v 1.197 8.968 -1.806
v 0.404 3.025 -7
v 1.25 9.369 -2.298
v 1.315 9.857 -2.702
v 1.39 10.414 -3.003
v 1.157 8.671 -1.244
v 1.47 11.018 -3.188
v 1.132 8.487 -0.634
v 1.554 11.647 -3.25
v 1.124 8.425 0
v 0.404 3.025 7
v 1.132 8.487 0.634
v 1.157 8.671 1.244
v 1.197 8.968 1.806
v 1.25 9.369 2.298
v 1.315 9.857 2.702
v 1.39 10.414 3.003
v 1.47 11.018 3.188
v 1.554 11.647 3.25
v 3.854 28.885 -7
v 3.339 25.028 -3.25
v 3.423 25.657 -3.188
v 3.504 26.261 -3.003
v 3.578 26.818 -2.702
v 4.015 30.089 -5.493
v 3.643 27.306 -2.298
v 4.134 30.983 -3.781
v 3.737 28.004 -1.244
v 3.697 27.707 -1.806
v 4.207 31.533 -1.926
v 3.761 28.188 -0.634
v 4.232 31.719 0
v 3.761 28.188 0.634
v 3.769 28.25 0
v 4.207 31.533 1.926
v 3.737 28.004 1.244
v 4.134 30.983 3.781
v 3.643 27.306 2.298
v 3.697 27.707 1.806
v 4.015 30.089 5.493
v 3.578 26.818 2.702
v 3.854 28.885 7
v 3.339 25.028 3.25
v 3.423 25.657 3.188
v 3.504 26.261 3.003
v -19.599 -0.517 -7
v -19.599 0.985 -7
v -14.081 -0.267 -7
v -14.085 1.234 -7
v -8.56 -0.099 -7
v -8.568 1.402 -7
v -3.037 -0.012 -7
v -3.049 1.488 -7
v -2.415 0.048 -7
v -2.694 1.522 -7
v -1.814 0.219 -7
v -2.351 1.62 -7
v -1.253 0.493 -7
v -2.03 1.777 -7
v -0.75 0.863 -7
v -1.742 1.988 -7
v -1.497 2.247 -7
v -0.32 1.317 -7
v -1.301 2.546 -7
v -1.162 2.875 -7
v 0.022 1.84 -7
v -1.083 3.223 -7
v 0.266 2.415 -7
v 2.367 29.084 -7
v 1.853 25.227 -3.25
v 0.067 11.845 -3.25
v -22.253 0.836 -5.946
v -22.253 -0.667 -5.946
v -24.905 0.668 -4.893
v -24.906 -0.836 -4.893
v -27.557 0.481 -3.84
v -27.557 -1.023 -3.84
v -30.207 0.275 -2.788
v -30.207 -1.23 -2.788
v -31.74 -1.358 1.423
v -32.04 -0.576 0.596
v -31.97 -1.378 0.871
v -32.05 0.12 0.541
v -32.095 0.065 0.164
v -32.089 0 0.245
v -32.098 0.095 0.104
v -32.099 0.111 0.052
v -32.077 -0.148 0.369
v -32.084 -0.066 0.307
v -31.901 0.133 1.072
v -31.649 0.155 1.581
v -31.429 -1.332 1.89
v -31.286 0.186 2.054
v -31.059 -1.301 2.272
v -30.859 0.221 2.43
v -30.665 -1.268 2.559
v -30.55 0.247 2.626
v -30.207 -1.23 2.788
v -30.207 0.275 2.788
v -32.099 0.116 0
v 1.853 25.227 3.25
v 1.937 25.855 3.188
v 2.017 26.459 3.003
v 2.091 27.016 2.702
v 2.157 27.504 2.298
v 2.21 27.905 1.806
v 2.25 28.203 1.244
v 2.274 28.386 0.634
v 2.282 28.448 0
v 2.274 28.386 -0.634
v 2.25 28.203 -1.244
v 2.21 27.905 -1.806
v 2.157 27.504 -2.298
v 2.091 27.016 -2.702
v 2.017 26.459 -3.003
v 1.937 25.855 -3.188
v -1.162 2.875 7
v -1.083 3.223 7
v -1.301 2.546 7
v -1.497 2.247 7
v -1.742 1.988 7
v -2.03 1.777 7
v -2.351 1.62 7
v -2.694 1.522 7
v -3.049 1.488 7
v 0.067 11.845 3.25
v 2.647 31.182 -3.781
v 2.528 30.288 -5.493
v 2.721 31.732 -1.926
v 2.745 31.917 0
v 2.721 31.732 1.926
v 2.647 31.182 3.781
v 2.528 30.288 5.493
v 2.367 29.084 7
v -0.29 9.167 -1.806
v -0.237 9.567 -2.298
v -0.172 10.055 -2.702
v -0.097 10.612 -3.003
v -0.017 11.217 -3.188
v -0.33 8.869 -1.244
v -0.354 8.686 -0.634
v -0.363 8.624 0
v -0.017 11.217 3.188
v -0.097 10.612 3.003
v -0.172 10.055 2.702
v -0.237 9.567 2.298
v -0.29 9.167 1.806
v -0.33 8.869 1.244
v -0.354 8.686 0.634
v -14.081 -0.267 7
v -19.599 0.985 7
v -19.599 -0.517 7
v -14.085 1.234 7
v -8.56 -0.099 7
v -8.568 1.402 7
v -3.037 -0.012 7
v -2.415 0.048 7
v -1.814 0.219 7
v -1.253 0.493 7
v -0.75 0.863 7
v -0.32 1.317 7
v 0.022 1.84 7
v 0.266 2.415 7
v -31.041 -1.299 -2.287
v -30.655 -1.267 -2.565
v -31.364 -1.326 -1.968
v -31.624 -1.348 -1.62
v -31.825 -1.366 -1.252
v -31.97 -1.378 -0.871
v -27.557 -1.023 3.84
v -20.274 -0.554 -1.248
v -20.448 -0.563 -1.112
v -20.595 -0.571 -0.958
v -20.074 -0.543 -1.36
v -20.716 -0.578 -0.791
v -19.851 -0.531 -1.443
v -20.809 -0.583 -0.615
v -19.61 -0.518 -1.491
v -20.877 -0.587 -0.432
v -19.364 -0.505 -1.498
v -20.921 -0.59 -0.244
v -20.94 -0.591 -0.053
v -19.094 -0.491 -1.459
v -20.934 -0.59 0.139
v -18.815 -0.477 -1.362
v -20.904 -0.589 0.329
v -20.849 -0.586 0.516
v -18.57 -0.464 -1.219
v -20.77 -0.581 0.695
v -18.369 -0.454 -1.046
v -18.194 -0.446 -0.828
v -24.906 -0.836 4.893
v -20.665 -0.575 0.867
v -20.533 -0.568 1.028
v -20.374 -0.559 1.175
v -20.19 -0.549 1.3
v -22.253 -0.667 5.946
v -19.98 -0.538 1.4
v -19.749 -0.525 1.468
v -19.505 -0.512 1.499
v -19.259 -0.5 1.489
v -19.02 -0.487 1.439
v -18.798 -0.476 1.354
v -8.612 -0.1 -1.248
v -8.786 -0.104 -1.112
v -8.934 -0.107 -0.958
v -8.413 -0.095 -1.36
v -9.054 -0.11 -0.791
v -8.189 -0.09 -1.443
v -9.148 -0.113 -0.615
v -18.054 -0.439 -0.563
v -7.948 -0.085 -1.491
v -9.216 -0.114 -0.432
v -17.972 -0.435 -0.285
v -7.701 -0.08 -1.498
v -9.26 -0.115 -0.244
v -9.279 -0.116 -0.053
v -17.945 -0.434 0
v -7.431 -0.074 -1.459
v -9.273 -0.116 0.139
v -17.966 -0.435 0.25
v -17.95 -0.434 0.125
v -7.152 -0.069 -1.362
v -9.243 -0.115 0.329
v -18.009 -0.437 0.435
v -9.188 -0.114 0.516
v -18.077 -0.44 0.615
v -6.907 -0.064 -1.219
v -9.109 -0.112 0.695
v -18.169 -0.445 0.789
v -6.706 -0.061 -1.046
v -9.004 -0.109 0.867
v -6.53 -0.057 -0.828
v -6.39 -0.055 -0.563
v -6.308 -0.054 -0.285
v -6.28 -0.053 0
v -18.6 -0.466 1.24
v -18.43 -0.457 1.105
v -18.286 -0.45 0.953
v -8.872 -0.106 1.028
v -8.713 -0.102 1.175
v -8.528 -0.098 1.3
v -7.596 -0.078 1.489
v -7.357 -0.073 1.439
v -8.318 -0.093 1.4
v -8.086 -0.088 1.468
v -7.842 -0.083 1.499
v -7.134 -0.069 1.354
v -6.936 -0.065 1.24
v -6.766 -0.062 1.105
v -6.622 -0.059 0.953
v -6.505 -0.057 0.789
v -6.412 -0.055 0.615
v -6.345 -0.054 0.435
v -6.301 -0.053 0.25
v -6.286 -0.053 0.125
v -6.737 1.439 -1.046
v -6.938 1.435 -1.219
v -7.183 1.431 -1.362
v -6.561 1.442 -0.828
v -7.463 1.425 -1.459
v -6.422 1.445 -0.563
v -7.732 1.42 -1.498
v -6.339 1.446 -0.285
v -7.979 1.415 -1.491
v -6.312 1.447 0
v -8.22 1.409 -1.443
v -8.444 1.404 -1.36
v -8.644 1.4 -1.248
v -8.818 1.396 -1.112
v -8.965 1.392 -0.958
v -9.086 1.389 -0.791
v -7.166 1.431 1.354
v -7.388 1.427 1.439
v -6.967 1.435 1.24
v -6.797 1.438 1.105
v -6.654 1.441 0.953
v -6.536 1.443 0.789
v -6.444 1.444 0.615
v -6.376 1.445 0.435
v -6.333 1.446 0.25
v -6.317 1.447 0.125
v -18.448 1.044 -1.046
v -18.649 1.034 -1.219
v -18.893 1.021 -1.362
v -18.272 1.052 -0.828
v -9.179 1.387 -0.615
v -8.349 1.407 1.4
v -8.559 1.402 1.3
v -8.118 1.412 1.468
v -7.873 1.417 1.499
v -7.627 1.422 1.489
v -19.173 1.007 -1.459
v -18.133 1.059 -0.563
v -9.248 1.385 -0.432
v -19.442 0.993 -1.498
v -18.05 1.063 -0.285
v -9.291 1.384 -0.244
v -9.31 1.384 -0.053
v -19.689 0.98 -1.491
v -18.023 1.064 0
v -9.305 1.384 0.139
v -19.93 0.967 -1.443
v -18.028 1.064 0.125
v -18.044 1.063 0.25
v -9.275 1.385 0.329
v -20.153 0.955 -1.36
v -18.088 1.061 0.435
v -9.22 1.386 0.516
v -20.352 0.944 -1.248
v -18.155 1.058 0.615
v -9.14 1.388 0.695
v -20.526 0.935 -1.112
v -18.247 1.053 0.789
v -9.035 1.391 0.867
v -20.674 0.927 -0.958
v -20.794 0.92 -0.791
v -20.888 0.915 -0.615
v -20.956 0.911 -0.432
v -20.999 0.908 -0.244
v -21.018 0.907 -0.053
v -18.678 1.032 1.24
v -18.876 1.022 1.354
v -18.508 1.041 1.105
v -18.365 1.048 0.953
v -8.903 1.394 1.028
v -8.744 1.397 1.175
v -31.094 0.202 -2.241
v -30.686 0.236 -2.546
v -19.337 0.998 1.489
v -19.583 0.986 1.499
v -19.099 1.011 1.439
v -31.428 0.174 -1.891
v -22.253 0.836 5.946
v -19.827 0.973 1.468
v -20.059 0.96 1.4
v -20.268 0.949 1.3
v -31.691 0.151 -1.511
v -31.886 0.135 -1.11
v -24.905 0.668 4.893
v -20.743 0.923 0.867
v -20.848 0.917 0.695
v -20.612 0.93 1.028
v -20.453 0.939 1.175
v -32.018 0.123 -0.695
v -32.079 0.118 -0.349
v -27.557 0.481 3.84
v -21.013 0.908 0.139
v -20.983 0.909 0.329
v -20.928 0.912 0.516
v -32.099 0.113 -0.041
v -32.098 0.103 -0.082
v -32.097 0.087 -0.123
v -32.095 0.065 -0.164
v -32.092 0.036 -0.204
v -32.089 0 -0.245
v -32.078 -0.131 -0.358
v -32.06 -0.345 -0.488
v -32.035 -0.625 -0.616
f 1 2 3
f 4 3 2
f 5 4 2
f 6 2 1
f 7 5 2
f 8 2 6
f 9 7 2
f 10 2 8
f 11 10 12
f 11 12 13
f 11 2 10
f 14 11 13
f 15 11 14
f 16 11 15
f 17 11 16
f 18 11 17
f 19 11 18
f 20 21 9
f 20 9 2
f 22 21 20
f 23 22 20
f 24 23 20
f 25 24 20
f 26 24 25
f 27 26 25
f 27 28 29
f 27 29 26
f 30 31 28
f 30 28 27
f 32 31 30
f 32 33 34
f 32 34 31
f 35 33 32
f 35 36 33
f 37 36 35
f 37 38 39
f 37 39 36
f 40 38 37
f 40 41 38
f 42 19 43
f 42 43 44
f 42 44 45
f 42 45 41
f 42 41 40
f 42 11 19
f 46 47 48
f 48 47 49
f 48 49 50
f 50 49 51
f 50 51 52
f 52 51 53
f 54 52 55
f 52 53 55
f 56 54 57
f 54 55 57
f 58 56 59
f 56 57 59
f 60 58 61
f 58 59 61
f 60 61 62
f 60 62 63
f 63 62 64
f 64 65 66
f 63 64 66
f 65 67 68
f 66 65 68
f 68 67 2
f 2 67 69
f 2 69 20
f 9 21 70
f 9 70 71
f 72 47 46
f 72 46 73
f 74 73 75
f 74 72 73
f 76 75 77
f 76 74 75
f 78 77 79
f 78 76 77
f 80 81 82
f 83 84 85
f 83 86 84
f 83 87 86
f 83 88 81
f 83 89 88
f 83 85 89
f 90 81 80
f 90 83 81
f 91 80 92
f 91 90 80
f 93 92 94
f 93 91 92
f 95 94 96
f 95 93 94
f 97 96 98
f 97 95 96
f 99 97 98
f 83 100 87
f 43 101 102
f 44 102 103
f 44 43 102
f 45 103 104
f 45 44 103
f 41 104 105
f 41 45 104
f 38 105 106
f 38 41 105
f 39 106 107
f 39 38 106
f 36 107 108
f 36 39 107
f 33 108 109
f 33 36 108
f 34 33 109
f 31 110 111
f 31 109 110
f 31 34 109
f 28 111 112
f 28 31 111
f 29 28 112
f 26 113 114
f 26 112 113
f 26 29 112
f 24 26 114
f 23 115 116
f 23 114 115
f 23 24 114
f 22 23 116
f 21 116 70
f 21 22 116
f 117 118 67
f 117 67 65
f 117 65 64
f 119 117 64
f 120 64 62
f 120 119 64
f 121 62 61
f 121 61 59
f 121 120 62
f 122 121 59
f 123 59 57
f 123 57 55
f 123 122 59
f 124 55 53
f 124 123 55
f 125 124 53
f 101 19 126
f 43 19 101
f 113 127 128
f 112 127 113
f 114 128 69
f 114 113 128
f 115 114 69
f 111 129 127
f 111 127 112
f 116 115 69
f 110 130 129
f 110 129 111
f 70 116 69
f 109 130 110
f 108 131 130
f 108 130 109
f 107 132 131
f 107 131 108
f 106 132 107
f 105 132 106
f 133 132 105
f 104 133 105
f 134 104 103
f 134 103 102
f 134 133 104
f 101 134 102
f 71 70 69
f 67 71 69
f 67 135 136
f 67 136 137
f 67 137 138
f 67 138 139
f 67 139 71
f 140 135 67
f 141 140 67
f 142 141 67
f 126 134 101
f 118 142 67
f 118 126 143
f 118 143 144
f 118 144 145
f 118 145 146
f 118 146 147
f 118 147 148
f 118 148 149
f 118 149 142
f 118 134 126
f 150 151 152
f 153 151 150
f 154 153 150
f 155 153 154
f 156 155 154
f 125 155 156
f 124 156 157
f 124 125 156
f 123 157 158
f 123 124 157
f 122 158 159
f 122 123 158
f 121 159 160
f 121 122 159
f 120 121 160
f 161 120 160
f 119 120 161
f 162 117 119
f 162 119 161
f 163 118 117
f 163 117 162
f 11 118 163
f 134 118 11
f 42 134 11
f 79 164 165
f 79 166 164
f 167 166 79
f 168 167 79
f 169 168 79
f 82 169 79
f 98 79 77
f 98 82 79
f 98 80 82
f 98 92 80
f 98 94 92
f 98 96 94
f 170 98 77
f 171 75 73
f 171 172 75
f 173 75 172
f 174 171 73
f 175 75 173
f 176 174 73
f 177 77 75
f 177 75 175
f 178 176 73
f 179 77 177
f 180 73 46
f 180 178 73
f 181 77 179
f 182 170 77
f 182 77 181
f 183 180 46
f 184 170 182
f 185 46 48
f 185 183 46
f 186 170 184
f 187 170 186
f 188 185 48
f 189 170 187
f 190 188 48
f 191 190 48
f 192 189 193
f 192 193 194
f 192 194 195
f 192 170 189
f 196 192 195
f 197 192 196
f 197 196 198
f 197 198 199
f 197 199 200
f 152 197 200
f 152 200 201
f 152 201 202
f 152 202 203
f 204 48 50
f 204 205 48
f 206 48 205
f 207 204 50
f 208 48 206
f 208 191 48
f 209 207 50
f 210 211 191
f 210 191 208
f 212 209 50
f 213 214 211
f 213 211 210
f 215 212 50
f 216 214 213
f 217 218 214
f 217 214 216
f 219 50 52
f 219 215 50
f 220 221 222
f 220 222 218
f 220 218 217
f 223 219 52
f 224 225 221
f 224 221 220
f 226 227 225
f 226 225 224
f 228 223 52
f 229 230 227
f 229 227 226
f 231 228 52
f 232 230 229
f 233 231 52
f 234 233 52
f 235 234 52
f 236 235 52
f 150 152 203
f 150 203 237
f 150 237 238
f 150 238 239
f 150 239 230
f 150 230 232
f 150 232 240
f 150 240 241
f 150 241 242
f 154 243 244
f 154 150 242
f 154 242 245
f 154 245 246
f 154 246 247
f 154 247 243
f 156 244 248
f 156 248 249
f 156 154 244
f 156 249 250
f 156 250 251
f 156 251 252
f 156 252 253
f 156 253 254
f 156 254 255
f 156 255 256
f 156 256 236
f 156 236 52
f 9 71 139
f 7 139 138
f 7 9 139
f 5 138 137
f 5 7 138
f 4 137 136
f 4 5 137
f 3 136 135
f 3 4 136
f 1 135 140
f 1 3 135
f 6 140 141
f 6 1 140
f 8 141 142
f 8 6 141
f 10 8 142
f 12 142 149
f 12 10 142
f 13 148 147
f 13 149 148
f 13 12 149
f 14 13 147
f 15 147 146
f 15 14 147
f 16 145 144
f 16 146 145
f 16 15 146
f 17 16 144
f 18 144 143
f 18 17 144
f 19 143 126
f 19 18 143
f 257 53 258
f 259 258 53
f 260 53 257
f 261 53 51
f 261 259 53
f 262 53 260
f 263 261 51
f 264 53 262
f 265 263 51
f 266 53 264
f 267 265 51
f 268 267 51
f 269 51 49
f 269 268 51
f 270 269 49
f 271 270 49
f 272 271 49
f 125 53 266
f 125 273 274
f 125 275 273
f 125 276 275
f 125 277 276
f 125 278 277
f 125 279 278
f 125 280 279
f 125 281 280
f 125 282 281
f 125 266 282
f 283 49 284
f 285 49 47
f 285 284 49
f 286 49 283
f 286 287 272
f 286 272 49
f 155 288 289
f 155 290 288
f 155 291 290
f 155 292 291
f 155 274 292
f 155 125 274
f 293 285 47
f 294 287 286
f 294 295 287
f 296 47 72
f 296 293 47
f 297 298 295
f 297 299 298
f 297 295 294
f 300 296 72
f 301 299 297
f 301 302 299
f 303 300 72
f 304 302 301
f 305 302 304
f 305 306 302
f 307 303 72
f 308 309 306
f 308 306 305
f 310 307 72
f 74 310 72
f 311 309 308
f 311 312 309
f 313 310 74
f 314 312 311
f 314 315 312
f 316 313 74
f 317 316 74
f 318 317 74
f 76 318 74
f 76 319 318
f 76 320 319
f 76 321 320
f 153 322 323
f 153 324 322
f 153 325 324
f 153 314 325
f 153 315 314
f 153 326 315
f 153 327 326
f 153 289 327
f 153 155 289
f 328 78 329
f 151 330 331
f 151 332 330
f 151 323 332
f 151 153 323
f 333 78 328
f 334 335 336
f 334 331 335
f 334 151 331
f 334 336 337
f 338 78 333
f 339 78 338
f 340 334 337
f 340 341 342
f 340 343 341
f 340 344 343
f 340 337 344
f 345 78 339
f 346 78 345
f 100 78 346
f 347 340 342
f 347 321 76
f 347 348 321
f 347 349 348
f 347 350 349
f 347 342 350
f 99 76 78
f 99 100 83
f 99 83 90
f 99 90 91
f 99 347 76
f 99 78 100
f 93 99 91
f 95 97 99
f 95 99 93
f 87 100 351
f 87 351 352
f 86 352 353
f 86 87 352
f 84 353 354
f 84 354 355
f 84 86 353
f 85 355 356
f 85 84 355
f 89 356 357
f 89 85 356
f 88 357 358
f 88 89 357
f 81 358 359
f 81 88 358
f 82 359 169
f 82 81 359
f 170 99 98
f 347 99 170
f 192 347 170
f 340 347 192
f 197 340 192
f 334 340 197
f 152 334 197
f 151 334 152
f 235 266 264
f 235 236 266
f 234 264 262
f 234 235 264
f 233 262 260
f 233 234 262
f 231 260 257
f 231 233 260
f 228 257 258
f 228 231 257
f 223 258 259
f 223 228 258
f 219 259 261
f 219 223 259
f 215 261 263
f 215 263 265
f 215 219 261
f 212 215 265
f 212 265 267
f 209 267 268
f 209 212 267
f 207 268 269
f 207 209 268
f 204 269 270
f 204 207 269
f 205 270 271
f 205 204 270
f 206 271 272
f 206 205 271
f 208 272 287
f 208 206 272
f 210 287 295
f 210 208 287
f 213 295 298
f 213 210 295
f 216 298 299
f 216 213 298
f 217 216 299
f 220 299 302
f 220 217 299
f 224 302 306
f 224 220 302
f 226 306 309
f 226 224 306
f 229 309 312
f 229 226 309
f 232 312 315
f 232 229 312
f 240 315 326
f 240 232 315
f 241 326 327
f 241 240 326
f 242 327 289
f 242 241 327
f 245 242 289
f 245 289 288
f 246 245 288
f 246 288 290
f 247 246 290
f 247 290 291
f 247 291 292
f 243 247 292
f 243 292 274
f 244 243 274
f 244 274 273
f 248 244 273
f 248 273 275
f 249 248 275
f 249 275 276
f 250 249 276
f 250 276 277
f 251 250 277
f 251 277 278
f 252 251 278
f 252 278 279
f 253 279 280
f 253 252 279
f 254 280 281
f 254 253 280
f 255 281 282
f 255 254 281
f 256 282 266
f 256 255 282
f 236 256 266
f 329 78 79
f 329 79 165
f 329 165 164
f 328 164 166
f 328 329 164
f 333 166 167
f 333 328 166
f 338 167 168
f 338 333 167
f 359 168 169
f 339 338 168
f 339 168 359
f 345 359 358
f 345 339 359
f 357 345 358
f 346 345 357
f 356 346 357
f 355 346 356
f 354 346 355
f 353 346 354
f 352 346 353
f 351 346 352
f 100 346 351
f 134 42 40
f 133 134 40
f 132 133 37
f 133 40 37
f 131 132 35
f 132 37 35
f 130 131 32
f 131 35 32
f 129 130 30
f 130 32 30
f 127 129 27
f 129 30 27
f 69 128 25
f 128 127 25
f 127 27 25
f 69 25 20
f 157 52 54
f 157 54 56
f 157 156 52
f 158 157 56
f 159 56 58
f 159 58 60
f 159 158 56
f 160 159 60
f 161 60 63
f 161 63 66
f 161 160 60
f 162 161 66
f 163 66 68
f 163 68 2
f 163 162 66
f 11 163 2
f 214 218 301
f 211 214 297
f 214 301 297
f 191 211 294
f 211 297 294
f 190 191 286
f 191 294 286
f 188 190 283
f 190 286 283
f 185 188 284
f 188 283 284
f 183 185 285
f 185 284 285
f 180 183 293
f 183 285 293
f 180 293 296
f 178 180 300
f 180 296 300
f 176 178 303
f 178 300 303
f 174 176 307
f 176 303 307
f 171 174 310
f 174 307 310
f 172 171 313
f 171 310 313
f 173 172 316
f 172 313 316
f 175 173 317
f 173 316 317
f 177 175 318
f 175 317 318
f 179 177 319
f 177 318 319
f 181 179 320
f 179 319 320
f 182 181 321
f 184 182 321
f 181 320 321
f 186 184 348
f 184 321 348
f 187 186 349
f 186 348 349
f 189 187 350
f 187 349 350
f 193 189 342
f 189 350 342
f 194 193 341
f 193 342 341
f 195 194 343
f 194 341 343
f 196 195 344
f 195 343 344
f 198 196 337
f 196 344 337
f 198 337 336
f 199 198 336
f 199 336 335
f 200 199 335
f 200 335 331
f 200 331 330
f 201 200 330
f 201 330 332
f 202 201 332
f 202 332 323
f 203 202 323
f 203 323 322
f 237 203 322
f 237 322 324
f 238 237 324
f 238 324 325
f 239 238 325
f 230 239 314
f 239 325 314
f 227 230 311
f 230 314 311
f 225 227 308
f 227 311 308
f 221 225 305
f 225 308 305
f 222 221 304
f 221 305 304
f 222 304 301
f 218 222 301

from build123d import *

# Parameters (mm, degrees)
EXTRUSION1_DEPTH             = 7
ENL_V_MAT_EXTRU_1_DEPTH      = 37.038682389
ENL_V_MAT_EXTRU_2_DEPTH      = 32.917281873
ENL_V_MAT_EXTRU_2_DEPTH_BACK = 2.378196501


with BuildPart() as part:
    # Esquisse1 → Extrusion1 (new body, symmetric)
    with BuildSketch(Plane.XY):
        with BuildLine():
            Line((0.403563953, 3.024571148), (4.232204488, 31.718897288))
            Line((4.232204488, 31.718897288), (2.745381178, 31.917281873))
            Line((2.745381178, 31.917281873), (-1.083259357, 3.222955733))
            ThreePointArc((-1.083259357, 3.222955733), (-1.742171349, 1.988036214), (-3.049340089, 1.487535348))
            ThreePointArc((-3.049340089, 1.487535348), (-17.587736804, 1.085119824), (-32.099393733, 0.116238776))
            Line((-32.099393733, 0.116238776), (-31.9703077, -1.378196501))
            ThreePointArc((-31.9703077, -1.378196501), (-17.51700864, -0.413211757), (-3.037077327, -0.012414526))
            ThreePointArc((-3.037077327, -0.012414526), (-0.749532032, 0.863461989), (0.403563953, 3.024571148))
        make_face()
    extrude(amount=EXTRUSION1_DEPTH, both=True)

    # Esquisse2 → Enlèv. mat.-Extru.1 (cut, through all)
    with BuildSketch(Plane(origin=(0, 0, 0), x_dir=(0, 0, -1), z_dir=(0.99121554, -0.13225639, 0))):
        with BuildLine():
            Line((-3.25, 11.75), (-3.25, 25.25))
            ThreePointArc((-3.25, 25.25), (0, 28.5), (3.25, 25.25))
            Line((3.25, 25.25), (3.25, 11.75))
            ThreePointArc((3.25, 11.75), (0, 8.5), (-3.25, 11.75))
        make_face()
        with BuildLine():
            Line((-7, 32), (-7, 29.141428429))
            ThreePointArc((-7, 29.141428429), (0, 32), (7, 29.141428429))
            Line((7, 29.141428429), (7, 32))
            ThreePointArc((7, 32), (0, 34.206555616), (-7, 32))
        make_face()
    extrude(amount=-ENL_V_MAT_EXTRU_1_DEPTH, mode=Mode.SUBTRACT)

    # Esquisse3 → Enlèv. mat.-Extru.2 (cut, two sides)
    with BuildSketch(Plane(origin=(0, 0, 0), x_dir=(1, 0, 0), z_dir=(0, 1, 0))) as enl_v_mat_extru_2_sk:
        with BuildLine():
            Line((-19.599393733, 7), (-30.206517298, 2.788239124))
            ThreePointArc((-30.206517298, 2.788239124), (-32.099393733, 0), (-30.206517298, -2.788239124))
            Line((-30.206517298, -2.788239124), (-19.599393733, -7))
            Line((-19.599393733, -7), (-32.099393733, -7))
            ThreePointArc((-32.099393733, -7), (-36.715166839, 0), (-32.099393733, 7))
            Line((-32.099393733, 7), (-19.599393733, 7))
        make_face()
    extrude(amount=ENL_V_MAT_EXTRU_2_DEPTH, mode=Mode.SUBTRACT)
    extrude(enl_v_mat_extru_2_sk.sketch, amount=-ENL_V_MAT_EXTRU_2_DEPTH_BACK, mode=Mode.SUBTRACT)

    # Esquisse4 → Enlèvement de matière-Révolution1 (revolve, cut)
    with BuildSketch(Plane.XY, mode=Mode.PRIVATE) as enl_vement_de_mati_re_r_volution1_sk:
        Polygon((-20.993708492, 29.083821309), (-19.397261786, -1.378196501), (-20.899320305, -1.378196501), (-22.495767011, 29.083821309), align=None)
    revolve(enl_vement_de_mati_re_r_volution1_sk.sketch.rotate(Axis((0, -371.5, 0), (-0.052335956, 0.998629535, 0)), 180), axis=Axis((0, -371.5, 0), (-0.052335956, 0.998629535, 0)), mode=Mode.SUBTRACT)  # turned: the seam where the file's is

    # Esquisse5 → Enlèvement de matière-Révolution2 (revolve, cut)
    with BuildSketch(Plane.XY, mode=Mode.PRIVATE) as enl_vement_de_mati_re_r_volution2_sk:
        Polygon((-9.530265596, 11.845167183), (-9.263238962, -0.902551216), (-7.763567936, -0.871137586), (-8.029936549, 11.845167183), align=None)
    revolve(enl_vement_de_mati_re_r_volution2_sk.sketch.rotate(Axis((0, -371.5, 0), (-0.02094242, 0.999780683, 0)), 180), axis=Axis((0, -371.5, 0), (-0.02094242, 0.999780683, 0)), mode=Mode.SUBTRACT)  # turned: the seam where the file's is


solid = part.part
